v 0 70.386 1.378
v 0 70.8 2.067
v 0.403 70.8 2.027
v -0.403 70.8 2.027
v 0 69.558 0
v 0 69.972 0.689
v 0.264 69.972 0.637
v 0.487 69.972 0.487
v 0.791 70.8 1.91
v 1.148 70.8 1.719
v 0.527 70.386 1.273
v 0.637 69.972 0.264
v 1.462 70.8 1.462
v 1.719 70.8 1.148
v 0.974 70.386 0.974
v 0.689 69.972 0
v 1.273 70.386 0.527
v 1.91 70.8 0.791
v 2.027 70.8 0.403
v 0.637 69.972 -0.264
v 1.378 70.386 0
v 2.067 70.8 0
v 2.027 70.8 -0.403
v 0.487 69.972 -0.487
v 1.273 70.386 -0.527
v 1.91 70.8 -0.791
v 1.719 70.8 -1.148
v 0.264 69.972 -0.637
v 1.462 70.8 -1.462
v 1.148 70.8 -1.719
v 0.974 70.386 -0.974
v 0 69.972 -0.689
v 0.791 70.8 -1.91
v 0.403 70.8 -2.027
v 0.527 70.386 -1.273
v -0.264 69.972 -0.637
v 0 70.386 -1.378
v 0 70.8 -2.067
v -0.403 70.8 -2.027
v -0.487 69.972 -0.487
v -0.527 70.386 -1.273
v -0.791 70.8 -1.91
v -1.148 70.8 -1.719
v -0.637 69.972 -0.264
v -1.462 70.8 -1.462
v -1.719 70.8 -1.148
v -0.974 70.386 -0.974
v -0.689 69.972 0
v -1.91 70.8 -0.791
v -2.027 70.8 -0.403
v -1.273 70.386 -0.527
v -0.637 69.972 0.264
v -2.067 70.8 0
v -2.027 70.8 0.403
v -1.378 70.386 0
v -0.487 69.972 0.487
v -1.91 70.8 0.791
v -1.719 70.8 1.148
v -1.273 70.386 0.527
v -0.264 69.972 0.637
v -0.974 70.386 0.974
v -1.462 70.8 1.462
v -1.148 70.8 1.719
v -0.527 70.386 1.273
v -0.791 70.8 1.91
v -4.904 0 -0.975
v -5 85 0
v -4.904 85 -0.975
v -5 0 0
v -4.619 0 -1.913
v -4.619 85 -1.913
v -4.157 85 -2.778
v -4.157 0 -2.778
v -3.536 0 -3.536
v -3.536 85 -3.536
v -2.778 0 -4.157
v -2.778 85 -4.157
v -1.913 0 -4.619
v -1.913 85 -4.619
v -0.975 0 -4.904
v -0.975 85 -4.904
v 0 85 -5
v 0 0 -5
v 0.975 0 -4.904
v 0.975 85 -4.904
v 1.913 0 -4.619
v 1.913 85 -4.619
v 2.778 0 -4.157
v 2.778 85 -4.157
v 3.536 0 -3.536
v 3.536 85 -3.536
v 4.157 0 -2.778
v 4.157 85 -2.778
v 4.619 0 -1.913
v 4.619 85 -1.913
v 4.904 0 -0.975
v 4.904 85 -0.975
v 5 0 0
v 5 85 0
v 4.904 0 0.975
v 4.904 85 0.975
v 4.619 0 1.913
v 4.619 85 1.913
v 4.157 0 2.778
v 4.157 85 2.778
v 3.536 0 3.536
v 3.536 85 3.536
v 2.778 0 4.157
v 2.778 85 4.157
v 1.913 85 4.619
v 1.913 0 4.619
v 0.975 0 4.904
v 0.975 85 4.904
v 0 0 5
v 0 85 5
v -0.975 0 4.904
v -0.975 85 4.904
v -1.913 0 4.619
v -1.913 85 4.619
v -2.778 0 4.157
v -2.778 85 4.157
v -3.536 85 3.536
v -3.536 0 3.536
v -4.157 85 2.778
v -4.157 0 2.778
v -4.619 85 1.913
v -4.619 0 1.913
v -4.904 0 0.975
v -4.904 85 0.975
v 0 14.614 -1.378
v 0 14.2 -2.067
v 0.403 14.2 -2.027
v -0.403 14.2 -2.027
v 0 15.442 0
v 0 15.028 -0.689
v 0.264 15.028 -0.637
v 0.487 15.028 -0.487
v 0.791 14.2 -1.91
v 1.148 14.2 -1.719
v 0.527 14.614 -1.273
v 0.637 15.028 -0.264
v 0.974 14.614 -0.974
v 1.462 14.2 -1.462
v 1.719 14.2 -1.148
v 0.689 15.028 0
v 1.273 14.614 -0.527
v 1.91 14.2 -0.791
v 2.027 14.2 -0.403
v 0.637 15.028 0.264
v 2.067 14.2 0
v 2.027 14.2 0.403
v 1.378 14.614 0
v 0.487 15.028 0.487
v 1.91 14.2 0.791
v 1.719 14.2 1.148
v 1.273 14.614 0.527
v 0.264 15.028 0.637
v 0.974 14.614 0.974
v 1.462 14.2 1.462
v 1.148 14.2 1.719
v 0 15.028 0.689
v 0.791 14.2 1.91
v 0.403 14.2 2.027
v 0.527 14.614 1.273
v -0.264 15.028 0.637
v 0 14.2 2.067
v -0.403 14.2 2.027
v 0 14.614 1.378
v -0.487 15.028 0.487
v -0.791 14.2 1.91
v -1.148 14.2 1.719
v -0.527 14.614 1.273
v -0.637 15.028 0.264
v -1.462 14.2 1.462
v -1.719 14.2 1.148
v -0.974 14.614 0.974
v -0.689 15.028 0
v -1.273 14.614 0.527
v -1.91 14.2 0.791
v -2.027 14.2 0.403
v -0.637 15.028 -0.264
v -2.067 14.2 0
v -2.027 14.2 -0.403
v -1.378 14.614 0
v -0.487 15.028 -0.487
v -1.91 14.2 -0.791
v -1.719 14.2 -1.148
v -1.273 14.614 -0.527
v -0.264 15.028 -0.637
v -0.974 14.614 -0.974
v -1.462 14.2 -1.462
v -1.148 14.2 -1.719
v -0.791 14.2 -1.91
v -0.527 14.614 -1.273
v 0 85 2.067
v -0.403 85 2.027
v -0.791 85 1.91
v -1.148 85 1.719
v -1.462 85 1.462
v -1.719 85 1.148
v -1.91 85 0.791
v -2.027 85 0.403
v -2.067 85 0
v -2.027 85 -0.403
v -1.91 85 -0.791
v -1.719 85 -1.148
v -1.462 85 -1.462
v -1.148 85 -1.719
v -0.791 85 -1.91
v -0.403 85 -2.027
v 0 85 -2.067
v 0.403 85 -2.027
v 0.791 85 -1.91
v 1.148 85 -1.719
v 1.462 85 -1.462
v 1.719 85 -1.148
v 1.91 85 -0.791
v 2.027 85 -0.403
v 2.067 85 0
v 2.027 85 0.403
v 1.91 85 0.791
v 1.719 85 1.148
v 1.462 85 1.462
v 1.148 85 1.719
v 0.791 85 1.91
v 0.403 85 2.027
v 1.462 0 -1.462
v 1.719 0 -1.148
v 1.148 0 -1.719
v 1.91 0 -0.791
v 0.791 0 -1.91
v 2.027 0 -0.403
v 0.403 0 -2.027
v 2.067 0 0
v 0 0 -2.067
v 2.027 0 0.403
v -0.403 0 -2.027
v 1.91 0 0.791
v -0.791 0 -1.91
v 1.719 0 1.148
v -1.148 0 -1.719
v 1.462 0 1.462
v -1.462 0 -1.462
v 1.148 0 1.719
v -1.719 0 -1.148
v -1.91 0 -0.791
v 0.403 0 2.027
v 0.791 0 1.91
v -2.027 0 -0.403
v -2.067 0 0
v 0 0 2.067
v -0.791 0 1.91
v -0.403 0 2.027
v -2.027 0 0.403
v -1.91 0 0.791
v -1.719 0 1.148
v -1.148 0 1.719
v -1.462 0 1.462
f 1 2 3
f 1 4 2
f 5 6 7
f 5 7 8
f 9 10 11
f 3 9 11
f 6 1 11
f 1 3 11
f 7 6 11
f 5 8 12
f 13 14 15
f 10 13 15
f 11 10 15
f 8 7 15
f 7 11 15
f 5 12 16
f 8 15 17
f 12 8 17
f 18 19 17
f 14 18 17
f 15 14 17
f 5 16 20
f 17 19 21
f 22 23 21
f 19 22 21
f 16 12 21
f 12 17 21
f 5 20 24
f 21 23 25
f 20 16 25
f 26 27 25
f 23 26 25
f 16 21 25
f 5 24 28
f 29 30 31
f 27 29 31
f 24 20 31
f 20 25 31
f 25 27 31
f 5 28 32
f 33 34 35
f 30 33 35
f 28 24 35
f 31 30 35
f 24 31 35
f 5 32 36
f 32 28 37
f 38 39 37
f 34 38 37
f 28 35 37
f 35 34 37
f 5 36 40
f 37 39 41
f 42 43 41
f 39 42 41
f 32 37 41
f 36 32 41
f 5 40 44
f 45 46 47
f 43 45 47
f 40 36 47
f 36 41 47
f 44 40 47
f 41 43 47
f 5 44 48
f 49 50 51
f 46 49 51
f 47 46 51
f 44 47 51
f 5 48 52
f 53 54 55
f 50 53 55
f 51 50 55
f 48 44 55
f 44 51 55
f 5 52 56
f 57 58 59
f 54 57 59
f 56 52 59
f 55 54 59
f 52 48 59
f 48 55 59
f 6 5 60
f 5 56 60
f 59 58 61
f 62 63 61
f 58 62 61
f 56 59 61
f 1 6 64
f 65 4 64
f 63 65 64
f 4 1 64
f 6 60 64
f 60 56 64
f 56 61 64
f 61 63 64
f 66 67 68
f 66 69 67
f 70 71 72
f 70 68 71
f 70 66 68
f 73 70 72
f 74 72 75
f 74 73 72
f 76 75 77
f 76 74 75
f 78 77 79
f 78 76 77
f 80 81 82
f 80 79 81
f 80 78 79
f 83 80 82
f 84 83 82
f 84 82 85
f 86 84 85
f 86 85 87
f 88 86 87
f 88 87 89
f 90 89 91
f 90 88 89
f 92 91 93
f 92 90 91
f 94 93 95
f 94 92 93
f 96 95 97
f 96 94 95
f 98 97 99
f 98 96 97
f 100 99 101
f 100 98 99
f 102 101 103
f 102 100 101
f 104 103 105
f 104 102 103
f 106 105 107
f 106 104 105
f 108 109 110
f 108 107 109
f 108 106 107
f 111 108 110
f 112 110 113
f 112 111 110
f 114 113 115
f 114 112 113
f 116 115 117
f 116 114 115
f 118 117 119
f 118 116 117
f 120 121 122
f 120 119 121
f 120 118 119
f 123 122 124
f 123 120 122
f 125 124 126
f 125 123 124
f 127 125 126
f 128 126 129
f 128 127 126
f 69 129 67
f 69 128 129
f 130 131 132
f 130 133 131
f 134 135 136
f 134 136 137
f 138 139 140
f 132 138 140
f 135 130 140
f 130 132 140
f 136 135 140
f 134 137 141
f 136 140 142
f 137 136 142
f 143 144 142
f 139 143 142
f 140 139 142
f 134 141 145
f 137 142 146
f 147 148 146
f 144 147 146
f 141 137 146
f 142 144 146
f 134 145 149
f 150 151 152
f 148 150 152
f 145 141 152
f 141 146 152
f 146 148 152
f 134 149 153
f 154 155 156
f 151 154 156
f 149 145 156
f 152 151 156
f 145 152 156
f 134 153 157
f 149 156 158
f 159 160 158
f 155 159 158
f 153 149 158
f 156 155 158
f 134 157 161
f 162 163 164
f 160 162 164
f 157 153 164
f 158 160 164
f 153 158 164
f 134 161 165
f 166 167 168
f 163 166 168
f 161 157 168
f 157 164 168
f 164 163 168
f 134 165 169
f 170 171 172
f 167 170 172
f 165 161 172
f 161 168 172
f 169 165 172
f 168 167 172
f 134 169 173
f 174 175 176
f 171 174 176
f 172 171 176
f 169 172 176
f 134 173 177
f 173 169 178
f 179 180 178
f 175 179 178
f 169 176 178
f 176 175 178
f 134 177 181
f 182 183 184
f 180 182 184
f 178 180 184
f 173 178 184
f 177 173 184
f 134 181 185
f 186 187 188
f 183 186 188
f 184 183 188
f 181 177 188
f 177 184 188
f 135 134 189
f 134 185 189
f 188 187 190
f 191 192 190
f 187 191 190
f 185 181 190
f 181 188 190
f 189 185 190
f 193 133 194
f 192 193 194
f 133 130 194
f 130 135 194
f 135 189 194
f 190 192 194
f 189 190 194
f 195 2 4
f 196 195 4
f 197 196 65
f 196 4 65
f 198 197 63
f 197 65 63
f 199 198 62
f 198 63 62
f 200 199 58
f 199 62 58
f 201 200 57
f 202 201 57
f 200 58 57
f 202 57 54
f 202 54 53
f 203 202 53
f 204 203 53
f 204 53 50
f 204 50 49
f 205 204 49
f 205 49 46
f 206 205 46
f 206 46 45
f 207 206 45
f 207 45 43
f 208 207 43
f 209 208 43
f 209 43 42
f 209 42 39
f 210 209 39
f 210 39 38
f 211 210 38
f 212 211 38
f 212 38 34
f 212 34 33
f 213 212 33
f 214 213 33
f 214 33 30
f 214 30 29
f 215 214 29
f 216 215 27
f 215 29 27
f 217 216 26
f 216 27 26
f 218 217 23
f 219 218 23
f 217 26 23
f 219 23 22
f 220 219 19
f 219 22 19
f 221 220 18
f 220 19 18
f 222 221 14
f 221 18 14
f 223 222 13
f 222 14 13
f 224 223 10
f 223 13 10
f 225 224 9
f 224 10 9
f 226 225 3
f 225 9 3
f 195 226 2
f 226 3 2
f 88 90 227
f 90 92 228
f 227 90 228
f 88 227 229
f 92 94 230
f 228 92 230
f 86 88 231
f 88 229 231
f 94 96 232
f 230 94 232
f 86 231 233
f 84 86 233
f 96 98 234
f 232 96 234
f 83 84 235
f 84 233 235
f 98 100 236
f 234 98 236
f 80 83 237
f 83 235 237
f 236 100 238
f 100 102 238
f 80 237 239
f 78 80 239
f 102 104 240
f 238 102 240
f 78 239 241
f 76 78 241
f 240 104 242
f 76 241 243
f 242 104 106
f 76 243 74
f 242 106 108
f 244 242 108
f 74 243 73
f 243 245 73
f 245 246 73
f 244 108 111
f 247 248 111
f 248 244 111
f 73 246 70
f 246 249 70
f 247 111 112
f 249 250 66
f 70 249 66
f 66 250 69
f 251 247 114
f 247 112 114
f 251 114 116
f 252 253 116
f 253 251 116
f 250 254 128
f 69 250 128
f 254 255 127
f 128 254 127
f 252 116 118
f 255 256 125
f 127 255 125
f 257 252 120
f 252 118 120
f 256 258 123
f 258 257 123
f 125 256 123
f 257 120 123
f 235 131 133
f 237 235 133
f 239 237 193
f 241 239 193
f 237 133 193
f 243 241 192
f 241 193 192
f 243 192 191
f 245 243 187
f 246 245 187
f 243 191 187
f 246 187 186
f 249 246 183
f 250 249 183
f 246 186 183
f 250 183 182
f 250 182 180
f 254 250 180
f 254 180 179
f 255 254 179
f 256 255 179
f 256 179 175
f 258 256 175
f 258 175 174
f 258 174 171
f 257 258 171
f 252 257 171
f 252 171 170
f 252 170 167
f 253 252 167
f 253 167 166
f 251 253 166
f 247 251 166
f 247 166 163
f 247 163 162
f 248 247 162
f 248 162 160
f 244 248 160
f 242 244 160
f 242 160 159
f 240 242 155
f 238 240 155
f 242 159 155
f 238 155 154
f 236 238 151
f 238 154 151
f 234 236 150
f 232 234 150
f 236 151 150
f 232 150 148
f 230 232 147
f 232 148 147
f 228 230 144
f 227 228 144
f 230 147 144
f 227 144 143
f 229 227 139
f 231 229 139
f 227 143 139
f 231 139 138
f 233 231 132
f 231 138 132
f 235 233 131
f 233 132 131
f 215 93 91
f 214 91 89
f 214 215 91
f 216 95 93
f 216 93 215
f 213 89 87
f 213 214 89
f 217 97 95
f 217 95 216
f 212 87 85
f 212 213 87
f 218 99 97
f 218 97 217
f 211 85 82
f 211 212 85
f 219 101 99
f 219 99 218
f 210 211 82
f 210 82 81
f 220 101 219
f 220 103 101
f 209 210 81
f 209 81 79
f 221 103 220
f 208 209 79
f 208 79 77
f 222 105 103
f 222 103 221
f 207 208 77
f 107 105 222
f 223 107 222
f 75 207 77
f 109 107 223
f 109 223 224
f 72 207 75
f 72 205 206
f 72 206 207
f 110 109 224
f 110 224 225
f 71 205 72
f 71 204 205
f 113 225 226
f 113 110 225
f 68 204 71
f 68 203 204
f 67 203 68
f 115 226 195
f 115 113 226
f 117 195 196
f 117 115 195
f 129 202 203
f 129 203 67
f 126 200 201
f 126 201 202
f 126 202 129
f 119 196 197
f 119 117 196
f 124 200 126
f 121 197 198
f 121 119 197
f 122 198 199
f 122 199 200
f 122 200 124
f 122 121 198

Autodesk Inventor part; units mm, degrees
ref_plane "YZ Plane" through (0, 0, 0) normal (1, 0, 0) x (0, 1, 0)
ref_plane "XZ Plane" through (0, 0, 0) normal (0, 1, 0) x (-1, 0, 0)
ref_plane "XY Plane" through (0, 0, 0) normal (0, 0, 1) x (1, 0, 0)
sketch "Esboço1" plane through (0, 0, 0) normal (0, 1, 0) x (-1, 0, 0)
  circle A0 centre (0, 0) radius 5
  dimension "d1" = 10
extrude "Extrusão1" add sketch "Esboço1" along normal blind 85
sketch "Esboço2" plane through (0, 0, 0) normal (0, -1, 0) x (1, 0, 0)
  circle A0 centre (0, 0) radius 5 projected
hole "Furo1" at (0, 0, 0) direction (0, 1, 0) diameter 4.134 depth 14.2 tip angle 118 thread size "M5x0.8" class "6H" standard "ISO Metric profile"
sketch "Esboço3" plane through (0, 85, 0) normal (0, 1, 0) x (1, 0, 0)
  circle A0 centre (0, 0) radius 5 projected
hole "Furo2" at (0, 85, 0) direction (0, -1, 0) diameter 4.134 depth 14.2 tip angle 118 thread size "M5x0.8" class "6H" standard "ISO Metric profile"
equation "\"Raio_vergadura\" = Espessura"
equation "\"Largura_alívio_de_vergadura\" = Espessura"
equation "\"Profundidade_alívio_de_vergadura\" = 0.5 * Espessura"
equation "\"Tamanho_alívio_de_dobra\" = 4 * Espessura"
equation "\"Remanescente_mínimo\" = 2 * Espessura"
equation "\"Raiodetransição\" = Raio_vergadura"
equation "\"Tamanho_de_raio_de_Jacobi\" = Raio_vergadura"
equation "\"TamanhoFolga\" = Espessura"
equation "\"Espessura\" = 0.5"
properties part number "Sustentação do motor" material "Latão, amarelo macio"
